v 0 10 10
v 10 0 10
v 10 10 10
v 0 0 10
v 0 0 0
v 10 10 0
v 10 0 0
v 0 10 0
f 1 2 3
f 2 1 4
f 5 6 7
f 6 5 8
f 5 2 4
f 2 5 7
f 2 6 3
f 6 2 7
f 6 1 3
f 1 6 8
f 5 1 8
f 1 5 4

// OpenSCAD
difference(){
	#cube([10,10,10])
	#translate([5,5,5]) cube([5,5,5]);
}
